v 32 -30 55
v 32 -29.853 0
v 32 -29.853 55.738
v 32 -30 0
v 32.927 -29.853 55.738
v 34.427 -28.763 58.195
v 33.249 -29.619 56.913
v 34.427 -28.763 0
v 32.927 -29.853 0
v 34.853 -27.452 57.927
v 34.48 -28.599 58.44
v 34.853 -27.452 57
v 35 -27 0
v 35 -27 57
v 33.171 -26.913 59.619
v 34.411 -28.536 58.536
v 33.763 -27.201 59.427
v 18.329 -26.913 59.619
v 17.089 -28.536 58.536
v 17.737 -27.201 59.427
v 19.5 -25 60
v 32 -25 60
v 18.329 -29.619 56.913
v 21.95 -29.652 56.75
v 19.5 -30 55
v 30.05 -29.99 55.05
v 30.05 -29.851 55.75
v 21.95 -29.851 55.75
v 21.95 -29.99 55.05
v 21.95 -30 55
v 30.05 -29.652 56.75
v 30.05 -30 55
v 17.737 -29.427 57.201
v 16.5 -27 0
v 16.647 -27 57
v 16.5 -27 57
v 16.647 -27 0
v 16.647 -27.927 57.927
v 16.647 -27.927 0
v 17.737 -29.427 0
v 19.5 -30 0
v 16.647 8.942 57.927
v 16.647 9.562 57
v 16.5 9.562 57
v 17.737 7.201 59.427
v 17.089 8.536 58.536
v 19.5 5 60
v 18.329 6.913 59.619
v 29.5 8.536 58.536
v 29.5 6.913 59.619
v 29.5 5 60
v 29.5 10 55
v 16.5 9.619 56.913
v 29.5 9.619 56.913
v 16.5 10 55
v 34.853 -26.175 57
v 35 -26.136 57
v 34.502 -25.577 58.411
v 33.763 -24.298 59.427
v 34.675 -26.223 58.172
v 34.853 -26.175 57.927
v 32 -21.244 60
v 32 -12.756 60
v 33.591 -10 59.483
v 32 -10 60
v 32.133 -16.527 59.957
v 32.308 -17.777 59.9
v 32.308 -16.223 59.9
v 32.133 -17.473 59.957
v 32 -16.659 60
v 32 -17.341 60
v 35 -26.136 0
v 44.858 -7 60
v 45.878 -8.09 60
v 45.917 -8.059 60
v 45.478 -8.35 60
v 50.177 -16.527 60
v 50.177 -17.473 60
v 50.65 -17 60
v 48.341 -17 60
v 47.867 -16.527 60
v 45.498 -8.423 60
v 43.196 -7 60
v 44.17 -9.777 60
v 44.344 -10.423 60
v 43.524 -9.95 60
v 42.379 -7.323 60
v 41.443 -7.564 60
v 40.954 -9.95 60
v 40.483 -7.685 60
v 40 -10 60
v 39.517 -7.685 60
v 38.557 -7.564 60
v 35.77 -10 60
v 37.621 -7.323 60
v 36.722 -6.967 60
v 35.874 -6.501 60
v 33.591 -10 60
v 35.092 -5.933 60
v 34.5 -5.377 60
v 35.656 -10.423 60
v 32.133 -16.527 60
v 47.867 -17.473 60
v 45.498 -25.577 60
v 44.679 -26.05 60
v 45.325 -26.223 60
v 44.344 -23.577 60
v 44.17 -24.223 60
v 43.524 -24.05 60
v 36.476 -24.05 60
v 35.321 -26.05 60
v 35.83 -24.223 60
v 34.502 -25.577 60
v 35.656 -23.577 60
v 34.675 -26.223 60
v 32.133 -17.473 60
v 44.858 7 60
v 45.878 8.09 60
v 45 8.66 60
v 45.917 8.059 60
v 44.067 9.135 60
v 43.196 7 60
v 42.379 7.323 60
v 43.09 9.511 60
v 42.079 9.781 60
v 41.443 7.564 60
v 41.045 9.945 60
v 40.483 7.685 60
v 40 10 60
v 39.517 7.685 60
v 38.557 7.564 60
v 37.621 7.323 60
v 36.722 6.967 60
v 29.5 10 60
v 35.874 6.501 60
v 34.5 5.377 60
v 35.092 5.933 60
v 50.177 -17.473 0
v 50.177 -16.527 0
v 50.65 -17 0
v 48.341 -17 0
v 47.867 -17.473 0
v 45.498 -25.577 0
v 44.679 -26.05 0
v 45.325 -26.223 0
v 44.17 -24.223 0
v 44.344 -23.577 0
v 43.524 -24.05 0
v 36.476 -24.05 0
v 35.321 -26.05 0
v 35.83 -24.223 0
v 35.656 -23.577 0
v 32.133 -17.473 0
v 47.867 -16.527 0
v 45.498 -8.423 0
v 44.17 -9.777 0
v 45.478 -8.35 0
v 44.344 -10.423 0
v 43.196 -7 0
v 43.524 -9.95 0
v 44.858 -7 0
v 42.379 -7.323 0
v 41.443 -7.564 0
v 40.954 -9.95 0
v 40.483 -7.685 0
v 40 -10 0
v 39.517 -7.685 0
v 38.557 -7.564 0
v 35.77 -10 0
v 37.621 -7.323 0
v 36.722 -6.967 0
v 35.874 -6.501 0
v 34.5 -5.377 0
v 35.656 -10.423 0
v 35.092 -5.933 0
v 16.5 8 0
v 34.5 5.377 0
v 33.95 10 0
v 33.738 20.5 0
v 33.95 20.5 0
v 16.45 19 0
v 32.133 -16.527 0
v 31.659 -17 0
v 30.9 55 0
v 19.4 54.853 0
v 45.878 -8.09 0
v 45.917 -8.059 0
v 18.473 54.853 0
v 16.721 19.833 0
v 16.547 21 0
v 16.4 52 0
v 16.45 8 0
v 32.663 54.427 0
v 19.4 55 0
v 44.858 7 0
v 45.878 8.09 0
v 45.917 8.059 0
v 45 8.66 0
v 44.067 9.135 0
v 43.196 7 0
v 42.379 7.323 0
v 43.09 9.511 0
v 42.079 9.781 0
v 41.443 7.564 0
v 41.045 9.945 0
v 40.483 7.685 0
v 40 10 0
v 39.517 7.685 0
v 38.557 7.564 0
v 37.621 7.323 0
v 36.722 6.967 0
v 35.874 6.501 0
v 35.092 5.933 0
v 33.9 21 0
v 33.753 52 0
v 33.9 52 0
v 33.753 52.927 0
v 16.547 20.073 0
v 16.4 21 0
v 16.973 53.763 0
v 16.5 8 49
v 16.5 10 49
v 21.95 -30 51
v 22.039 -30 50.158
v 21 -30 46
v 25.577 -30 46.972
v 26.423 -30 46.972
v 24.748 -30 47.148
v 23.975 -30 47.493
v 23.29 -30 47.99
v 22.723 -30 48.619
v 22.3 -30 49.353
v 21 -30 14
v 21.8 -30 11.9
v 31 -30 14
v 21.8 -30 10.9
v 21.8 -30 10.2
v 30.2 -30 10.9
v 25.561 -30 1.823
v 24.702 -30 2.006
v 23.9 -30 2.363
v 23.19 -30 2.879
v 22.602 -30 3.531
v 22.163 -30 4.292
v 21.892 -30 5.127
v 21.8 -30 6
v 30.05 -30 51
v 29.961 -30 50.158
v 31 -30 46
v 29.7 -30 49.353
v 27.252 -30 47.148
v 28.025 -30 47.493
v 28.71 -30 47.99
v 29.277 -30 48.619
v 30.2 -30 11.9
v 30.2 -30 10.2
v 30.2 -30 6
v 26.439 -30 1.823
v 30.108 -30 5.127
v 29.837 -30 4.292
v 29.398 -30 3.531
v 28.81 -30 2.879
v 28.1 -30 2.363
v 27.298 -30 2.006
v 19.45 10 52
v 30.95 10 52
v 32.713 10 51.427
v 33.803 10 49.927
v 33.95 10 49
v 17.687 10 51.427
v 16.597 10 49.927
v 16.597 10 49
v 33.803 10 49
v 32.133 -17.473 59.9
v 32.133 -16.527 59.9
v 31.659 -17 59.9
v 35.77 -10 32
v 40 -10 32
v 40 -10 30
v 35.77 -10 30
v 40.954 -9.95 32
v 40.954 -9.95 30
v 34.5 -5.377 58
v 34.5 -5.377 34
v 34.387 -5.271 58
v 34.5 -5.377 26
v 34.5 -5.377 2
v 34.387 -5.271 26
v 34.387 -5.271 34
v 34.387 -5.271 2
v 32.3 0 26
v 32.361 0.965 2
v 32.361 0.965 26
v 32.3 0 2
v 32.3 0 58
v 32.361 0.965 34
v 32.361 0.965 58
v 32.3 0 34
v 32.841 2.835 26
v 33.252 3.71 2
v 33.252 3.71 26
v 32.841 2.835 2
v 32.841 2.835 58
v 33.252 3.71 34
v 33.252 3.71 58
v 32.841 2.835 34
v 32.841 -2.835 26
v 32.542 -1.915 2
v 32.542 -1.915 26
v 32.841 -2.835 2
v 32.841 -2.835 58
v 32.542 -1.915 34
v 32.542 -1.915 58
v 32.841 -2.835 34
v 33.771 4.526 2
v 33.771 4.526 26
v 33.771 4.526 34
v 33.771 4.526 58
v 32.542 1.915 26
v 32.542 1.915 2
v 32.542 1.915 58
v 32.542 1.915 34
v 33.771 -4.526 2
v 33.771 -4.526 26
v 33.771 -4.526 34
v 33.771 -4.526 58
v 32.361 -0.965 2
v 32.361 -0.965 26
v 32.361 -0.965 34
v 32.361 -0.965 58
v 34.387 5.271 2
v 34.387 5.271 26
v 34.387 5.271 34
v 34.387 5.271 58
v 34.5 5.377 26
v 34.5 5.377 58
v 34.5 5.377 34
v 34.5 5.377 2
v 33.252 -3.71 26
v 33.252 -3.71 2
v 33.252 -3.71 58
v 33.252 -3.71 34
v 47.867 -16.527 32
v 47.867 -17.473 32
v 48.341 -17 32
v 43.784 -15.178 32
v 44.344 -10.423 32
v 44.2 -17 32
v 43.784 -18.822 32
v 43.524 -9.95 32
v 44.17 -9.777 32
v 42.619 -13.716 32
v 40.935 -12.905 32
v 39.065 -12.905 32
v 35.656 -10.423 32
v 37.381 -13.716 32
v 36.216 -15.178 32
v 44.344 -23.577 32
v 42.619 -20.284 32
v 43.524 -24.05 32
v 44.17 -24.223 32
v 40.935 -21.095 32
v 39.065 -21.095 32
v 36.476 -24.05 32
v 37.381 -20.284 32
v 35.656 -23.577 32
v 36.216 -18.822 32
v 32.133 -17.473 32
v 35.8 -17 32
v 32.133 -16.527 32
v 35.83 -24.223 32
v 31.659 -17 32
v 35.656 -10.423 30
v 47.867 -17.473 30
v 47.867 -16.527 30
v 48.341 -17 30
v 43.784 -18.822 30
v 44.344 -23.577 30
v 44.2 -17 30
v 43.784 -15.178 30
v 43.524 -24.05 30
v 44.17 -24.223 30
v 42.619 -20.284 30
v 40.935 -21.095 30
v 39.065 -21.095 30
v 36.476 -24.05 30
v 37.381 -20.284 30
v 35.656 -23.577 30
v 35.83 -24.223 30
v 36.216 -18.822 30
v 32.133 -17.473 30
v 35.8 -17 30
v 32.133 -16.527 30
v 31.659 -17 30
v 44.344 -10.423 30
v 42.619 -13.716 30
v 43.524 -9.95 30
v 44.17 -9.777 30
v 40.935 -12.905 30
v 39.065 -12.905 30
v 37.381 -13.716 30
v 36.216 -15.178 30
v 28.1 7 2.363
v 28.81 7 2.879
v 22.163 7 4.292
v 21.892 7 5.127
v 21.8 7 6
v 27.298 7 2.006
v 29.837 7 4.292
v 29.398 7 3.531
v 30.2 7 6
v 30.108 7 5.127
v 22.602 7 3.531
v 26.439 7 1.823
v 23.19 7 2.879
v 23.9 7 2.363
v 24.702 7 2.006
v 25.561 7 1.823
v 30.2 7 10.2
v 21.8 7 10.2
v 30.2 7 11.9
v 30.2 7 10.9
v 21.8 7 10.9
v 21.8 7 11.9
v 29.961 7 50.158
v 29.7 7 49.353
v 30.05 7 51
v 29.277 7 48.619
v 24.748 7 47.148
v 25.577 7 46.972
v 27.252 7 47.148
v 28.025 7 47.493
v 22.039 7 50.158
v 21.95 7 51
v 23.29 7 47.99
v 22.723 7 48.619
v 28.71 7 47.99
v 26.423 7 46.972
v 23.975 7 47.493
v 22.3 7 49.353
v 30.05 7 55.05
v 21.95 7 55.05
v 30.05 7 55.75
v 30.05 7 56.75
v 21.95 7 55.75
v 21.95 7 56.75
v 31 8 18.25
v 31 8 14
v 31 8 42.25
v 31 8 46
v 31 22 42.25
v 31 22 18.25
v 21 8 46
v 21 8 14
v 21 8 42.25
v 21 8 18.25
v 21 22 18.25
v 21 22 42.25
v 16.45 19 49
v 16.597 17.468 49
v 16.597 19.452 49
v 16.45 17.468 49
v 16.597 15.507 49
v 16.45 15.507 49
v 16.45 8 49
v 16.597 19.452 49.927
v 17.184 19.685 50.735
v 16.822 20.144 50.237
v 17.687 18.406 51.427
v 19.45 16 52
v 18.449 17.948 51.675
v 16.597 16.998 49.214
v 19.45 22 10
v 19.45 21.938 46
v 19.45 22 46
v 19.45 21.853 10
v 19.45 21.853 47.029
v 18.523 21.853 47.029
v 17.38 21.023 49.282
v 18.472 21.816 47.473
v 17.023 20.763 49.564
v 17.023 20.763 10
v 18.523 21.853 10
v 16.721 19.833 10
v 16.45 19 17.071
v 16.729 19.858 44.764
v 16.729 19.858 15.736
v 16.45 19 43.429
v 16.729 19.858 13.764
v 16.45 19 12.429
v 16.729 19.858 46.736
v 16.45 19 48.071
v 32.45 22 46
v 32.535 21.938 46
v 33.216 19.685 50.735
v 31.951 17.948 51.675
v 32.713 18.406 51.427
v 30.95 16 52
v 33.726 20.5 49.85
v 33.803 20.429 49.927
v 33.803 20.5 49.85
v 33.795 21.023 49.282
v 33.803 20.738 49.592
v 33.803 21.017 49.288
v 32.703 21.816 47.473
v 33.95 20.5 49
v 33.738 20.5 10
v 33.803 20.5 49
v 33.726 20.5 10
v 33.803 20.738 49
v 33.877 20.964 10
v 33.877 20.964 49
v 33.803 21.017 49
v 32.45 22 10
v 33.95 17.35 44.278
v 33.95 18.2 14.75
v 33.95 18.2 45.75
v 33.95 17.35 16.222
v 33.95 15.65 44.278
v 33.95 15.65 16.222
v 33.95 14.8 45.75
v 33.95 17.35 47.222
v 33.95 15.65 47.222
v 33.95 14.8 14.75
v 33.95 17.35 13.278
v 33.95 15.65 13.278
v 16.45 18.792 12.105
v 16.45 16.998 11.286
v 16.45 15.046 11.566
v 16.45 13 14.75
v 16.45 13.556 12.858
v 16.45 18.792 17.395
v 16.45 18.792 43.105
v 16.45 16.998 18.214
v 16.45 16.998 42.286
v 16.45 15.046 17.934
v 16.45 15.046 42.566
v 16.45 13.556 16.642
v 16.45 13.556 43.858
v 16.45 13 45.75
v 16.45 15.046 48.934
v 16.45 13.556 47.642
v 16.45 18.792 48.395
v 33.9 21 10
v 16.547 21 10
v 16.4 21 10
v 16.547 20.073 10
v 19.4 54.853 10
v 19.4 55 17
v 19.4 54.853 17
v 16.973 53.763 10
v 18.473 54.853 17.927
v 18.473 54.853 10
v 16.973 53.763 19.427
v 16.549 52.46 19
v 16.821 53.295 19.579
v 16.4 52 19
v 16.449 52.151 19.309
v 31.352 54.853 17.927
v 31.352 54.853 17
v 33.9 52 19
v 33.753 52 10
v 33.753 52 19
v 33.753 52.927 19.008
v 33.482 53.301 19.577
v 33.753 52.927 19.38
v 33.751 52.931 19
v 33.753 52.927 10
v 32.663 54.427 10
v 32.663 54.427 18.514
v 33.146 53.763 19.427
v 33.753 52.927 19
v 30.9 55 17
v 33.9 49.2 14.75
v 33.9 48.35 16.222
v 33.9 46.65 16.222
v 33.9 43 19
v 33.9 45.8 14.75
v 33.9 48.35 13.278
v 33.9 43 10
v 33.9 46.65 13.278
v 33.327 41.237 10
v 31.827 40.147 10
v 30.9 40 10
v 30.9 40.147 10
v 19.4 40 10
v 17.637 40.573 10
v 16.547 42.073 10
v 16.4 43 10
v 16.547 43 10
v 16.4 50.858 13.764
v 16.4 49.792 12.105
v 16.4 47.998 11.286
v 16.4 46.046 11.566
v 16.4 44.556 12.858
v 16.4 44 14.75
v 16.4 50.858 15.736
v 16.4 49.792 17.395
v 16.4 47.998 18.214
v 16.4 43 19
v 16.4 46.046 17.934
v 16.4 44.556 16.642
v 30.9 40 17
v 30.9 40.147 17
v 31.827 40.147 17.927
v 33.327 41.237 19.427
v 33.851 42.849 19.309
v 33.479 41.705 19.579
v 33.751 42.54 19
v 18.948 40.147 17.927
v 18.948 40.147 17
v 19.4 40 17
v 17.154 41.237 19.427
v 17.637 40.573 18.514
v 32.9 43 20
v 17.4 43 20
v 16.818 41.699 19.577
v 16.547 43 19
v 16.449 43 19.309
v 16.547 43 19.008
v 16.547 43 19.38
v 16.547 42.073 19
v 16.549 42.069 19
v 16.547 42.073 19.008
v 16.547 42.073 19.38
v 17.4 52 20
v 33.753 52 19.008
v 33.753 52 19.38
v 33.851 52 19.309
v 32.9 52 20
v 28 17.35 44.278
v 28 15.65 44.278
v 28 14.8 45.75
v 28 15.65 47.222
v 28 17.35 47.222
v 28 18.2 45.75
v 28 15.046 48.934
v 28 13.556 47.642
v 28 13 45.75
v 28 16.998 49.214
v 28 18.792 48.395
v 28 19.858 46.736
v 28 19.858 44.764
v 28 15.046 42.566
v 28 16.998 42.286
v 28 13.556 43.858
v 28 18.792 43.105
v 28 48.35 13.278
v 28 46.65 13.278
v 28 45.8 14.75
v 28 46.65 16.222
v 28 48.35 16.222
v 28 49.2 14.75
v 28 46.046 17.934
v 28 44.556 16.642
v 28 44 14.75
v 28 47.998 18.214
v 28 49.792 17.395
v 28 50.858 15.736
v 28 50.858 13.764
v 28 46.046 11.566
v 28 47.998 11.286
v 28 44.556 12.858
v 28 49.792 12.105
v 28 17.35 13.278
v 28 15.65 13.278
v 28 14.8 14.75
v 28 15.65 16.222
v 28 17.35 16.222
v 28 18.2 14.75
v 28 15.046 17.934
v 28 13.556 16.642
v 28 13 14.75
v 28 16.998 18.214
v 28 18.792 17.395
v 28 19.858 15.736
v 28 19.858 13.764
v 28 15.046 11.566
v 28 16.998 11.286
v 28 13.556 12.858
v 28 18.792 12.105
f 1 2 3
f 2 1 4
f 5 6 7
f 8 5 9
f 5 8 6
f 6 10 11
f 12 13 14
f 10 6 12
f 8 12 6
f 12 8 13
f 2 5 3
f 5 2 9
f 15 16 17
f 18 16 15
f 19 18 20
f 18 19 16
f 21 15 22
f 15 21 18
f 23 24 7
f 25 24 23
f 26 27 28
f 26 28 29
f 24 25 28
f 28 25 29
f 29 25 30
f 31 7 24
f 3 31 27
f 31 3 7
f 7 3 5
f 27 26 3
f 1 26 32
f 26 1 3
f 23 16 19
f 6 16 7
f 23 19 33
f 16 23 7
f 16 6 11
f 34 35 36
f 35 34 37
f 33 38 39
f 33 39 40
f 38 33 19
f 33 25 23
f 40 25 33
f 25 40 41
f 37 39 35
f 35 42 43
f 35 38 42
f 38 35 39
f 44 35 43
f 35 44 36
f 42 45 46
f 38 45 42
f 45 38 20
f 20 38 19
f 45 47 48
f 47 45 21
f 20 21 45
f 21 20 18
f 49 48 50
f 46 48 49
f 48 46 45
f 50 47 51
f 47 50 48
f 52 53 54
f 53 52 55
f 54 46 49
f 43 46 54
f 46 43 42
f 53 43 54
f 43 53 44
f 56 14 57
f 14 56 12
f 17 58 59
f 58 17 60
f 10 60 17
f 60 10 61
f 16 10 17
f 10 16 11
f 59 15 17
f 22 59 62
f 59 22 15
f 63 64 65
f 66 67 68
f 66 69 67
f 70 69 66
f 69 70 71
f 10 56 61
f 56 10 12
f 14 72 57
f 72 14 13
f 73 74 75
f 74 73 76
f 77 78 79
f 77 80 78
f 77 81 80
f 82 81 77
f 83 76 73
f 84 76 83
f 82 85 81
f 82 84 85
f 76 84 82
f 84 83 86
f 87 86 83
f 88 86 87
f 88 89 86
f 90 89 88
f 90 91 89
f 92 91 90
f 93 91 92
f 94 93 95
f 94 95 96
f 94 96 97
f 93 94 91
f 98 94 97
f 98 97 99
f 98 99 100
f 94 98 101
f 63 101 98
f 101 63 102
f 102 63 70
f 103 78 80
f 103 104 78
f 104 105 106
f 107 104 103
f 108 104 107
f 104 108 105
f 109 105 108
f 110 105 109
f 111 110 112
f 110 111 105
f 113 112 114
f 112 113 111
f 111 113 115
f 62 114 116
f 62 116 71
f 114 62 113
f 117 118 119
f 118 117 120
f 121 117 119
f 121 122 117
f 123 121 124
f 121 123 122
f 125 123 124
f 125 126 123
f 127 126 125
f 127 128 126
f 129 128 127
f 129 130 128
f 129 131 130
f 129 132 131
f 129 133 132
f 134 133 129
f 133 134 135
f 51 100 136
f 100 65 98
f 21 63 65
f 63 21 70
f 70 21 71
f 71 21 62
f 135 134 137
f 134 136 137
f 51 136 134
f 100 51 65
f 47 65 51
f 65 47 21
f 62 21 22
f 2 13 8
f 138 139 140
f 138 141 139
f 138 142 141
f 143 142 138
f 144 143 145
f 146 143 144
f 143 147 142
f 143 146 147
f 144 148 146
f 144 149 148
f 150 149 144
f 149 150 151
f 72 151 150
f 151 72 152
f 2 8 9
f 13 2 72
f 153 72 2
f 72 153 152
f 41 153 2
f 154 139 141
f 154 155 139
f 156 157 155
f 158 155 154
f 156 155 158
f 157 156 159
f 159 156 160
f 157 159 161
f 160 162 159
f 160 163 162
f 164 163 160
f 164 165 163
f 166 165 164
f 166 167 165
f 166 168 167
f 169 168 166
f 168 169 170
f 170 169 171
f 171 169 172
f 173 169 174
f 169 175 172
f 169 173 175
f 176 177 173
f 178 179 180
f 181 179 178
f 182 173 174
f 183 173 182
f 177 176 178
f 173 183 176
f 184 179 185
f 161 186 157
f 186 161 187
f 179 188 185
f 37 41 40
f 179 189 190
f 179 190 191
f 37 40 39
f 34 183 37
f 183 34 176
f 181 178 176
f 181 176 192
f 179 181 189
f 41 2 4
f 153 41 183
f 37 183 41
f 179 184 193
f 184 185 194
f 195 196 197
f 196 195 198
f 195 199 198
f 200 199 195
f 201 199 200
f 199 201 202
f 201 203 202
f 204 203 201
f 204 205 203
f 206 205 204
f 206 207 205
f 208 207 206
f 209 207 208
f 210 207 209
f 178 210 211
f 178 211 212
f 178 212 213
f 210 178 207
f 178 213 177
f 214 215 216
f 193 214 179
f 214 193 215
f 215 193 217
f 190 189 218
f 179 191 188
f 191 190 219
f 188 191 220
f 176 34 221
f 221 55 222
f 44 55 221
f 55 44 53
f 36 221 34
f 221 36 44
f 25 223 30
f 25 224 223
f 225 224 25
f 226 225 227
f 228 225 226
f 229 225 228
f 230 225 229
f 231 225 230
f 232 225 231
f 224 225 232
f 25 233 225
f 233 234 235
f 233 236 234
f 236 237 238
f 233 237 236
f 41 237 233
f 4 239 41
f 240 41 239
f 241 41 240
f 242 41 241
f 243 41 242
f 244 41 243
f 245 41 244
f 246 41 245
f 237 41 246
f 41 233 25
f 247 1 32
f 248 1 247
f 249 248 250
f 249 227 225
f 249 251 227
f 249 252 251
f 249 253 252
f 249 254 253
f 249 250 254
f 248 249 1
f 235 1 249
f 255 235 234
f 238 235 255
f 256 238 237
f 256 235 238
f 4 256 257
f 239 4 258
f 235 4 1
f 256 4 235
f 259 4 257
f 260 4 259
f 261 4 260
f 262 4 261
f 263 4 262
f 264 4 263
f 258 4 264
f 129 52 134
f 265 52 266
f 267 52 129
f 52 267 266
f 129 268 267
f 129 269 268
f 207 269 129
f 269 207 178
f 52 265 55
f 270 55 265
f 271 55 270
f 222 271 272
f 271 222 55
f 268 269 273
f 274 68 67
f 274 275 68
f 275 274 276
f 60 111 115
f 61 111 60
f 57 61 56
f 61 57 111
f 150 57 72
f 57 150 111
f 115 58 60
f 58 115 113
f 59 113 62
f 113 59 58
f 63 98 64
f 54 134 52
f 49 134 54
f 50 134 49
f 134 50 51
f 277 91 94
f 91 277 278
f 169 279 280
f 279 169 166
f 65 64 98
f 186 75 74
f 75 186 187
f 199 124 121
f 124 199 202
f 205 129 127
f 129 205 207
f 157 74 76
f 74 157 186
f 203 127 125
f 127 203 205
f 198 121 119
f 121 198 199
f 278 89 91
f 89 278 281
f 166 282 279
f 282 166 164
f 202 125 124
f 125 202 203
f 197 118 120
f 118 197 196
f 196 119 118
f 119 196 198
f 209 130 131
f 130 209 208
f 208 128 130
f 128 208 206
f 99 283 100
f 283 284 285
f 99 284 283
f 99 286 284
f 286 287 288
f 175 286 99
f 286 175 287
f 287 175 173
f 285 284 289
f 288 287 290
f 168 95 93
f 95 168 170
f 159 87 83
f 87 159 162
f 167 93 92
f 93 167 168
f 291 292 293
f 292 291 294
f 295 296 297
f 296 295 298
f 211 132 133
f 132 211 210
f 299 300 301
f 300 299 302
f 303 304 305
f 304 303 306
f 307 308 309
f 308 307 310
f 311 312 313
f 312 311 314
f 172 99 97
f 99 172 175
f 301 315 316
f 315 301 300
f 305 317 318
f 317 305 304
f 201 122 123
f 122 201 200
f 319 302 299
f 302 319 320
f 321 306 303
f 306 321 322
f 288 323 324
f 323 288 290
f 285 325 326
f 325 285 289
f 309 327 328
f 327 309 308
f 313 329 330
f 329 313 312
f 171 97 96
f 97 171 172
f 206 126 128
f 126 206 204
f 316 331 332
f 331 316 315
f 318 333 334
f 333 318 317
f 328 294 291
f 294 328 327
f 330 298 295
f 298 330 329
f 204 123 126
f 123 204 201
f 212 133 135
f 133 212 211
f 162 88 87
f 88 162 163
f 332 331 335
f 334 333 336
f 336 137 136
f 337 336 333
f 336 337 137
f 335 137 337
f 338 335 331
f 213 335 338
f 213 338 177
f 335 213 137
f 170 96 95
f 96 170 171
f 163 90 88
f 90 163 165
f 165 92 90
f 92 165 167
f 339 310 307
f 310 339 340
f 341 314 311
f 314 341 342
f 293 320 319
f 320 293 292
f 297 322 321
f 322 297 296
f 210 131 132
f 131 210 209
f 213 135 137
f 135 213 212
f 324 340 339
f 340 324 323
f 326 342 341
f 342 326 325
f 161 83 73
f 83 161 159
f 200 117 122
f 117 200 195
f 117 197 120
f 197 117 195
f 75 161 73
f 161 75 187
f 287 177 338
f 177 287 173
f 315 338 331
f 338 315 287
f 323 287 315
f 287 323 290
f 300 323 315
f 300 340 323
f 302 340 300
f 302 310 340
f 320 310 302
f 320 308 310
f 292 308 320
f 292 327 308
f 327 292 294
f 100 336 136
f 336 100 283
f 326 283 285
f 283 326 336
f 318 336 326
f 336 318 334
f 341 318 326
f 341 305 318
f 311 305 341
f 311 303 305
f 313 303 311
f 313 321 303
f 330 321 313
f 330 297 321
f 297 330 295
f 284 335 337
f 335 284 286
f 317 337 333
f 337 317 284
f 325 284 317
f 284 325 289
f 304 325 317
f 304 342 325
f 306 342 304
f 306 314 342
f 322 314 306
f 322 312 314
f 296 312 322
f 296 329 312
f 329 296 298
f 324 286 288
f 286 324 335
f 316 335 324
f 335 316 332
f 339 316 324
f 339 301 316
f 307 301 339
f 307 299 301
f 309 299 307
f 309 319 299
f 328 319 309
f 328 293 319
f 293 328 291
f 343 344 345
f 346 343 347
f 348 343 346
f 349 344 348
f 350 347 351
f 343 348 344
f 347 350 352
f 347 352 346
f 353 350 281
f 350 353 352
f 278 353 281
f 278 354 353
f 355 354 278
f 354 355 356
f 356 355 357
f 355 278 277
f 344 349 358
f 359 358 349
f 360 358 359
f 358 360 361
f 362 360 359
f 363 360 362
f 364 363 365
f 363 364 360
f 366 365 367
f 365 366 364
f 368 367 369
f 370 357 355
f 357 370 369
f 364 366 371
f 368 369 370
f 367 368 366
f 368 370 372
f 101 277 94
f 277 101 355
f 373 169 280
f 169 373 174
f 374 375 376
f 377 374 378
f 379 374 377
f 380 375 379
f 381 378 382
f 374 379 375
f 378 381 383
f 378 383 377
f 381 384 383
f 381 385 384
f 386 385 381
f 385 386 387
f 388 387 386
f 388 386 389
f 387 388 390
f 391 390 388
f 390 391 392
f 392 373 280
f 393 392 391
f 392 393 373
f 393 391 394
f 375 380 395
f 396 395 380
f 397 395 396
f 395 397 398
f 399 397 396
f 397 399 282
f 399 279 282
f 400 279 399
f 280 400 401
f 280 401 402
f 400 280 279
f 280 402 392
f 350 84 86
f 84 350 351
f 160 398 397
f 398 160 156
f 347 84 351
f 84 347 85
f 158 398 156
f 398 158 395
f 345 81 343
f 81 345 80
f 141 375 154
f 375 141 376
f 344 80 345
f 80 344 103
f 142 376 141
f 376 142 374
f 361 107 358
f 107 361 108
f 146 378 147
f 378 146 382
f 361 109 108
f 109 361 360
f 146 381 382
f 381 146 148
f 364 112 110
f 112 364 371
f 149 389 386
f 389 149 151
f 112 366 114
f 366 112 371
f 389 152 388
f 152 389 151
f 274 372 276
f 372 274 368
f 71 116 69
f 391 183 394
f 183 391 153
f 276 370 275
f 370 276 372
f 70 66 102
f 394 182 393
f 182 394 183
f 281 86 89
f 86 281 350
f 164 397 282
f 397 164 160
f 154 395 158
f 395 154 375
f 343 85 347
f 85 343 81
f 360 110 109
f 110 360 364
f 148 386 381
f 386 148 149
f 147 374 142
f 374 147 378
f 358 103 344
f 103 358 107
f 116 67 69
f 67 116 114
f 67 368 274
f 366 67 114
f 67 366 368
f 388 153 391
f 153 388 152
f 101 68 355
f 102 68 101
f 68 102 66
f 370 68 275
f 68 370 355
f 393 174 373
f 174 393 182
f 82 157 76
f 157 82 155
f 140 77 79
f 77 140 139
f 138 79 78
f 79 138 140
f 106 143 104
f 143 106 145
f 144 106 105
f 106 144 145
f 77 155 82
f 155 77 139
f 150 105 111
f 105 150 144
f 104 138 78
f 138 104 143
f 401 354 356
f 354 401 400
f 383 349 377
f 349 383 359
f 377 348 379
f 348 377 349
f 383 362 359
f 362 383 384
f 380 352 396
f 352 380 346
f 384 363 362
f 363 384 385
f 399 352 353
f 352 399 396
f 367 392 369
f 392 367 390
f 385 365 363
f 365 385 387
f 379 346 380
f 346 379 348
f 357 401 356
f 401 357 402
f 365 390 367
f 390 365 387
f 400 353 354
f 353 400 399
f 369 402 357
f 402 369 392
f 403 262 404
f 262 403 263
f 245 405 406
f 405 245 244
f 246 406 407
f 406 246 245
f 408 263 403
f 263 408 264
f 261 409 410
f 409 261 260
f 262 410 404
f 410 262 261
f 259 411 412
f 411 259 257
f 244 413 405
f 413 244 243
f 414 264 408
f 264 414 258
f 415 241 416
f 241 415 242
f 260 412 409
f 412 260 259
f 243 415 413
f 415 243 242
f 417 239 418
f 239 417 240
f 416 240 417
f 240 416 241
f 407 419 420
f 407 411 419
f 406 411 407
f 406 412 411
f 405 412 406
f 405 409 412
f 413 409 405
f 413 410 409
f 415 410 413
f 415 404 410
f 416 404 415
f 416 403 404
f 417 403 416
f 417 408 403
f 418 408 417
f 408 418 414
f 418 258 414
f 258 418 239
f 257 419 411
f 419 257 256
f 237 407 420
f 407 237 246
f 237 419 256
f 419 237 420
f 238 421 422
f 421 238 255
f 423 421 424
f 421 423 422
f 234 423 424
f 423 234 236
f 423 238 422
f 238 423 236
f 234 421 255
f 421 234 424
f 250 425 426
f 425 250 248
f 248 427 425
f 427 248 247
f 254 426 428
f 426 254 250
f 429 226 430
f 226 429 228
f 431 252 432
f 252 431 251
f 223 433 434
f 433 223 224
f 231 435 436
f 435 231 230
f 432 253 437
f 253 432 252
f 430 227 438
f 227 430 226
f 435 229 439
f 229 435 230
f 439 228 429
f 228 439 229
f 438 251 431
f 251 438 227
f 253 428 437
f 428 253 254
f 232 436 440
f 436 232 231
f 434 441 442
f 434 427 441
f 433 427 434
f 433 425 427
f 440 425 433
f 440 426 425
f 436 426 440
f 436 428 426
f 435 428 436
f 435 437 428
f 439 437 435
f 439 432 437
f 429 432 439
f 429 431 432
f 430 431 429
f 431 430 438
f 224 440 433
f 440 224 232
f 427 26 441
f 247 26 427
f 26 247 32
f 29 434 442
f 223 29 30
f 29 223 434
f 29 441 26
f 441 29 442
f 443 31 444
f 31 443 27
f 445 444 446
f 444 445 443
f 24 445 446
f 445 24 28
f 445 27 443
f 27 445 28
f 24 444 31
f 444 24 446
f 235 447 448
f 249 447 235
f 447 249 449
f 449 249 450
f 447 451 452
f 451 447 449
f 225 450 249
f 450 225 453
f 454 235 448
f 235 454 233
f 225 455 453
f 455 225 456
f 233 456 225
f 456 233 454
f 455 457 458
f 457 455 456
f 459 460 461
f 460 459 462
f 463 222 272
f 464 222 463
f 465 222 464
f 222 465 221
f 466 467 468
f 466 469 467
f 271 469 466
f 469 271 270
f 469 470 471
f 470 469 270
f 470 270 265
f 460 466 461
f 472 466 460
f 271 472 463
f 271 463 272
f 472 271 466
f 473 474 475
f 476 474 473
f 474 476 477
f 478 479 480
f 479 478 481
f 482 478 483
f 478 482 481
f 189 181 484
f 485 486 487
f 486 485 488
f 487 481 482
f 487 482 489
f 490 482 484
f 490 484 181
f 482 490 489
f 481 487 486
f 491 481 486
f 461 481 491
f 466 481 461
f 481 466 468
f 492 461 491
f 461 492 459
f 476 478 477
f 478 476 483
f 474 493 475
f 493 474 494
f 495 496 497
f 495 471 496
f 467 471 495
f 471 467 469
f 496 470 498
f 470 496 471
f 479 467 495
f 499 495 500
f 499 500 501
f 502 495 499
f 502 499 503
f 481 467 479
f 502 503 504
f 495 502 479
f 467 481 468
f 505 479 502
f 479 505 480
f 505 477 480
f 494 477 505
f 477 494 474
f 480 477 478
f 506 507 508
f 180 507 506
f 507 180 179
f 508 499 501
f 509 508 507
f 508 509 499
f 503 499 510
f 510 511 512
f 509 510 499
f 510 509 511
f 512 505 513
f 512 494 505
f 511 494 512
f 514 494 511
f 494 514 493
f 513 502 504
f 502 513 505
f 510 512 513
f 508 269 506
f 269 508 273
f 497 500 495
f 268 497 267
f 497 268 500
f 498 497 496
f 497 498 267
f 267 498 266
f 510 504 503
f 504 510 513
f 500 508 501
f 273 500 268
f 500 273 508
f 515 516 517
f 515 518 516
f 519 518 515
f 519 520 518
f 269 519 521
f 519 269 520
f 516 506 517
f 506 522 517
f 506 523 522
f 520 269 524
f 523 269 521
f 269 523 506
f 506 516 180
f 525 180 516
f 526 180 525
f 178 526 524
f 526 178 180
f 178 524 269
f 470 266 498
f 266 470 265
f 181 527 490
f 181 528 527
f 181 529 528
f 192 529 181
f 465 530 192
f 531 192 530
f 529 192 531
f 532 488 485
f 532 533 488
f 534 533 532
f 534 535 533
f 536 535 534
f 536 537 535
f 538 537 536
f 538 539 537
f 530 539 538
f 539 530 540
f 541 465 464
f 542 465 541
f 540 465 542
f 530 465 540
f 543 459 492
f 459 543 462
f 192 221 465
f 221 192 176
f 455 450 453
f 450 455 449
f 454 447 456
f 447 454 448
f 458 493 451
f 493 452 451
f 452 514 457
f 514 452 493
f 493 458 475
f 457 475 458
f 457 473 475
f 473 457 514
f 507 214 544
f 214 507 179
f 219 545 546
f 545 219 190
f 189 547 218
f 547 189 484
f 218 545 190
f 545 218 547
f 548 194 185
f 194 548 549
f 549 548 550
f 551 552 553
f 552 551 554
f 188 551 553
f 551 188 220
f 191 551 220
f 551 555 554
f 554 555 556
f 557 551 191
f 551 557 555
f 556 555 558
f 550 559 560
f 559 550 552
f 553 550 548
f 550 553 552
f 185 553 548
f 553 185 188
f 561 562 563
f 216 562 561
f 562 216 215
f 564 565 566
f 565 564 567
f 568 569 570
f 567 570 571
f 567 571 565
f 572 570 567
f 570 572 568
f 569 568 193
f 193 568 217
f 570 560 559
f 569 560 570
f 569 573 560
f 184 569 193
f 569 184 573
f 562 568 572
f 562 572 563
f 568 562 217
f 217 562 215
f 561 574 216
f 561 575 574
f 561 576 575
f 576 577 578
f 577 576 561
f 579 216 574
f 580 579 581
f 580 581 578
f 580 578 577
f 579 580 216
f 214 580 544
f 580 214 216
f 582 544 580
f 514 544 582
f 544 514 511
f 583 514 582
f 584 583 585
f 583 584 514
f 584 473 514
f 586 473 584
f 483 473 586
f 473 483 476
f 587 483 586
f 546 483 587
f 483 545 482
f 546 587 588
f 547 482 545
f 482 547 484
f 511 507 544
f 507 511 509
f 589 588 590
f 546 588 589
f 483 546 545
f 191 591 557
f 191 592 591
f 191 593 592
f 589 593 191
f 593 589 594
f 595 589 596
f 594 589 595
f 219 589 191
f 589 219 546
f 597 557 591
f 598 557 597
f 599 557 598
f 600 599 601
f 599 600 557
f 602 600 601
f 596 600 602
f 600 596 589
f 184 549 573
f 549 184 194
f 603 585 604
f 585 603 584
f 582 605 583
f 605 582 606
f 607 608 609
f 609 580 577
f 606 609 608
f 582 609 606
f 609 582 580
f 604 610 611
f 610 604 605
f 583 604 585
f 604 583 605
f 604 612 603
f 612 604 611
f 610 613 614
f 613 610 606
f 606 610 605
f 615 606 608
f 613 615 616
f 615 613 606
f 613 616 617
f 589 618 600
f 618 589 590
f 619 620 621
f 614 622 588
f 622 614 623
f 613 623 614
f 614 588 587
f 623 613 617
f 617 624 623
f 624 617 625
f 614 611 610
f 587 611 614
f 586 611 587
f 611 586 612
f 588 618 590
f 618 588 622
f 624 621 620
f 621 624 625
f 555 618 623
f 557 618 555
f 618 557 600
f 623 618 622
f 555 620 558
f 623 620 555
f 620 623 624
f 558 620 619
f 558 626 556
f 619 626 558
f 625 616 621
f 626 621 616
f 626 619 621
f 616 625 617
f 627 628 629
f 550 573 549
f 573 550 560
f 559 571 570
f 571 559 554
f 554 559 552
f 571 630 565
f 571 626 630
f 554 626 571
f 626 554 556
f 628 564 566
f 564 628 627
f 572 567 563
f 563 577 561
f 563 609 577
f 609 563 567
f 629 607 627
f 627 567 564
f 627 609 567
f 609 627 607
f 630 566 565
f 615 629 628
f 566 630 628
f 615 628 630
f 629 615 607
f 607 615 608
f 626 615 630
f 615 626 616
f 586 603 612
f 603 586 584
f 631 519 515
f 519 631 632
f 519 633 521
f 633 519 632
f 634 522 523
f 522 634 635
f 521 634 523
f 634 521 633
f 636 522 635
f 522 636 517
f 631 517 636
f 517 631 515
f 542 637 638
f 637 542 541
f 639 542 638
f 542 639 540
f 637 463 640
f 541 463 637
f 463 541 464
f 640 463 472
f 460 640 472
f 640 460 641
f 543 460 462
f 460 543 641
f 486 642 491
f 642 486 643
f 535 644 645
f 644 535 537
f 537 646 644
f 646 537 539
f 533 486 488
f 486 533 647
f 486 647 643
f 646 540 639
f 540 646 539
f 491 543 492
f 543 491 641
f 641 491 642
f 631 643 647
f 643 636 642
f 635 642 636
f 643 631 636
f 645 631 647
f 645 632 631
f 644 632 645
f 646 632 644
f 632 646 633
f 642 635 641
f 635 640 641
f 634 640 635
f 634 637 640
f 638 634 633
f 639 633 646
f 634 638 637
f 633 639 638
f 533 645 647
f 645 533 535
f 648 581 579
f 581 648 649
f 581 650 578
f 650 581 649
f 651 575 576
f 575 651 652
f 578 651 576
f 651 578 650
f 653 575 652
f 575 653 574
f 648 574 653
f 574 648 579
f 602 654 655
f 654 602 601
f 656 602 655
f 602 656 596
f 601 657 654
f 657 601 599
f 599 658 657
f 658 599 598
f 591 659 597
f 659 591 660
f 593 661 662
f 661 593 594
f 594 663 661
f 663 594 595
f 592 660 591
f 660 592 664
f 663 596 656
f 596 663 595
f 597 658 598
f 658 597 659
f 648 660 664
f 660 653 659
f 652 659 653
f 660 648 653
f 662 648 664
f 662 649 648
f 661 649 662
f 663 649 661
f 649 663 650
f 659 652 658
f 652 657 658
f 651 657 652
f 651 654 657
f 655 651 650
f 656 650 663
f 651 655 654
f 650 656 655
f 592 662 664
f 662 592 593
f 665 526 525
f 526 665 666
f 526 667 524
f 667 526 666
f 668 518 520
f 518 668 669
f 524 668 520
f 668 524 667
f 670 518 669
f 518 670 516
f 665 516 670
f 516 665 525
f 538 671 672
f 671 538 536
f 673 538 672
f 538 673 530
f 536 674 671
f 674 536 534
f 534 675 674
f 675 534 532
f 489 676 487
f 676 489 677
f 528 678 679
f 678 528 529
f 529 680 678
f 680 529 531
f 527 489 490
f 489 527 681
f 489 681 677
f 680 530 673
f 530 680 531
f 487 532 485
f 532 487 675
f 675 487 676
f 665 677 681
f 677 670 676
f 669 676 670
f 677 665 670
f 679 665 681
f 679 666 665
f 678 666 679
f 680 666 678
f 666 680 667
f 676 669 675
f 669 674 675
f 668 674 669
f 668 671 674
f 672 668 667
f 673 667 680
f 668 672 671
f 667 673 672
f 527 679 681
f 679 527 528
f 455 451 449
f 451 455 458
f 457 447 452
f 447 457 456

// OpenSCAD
// file: inc/functions.scad
// PRUSA iteration3
// Functions used in many files
// GNU GPL v3
// Josef Průša <josefprusa@me.com>
// Václav 'ax' Hůla <axtheb@gmail.com>
// Vlnofka <>
// http://www.reprap.org/wiki/Prusa_Mendel
// http://github.com/prusajr/PrusaMendel

module roundcorner(diameter){
	difference(){
		cube(size = [diameter,diameter,99], center = false);
		translate(v = [diameter, diameter, 0]) cylinder(h = 100, r=diameter, center=true);
	}
}
module nut(d,h,horizontal=true){
    cornerdiameter =  (d / 2) / cos (180 / 6);
    cylinder(h = h, r = cornerdiameter, $fn = 6);
    if(horizontal){
        for(i = [1:6]){
            rotate([0,0,60*i]) translate([-cornerdiameter-0.2,0,0]) rotate([0,0,-45]) cube([2,2,h]);
        }
    }
}

// Based on nophead research
module polyhole(d, h, center=false) {
    n = max(round(2 * d),3);
    rotate([0,0,180])
        cylinder(h = h, r = (d / 2) / cos (180 / n), $fn = n);
}

// make it interchangeable between this and cylinder
module cylinder_poly(r, h, center=false){
    polyhole(d=r*2, h=h, center=center);
}

module fillet(radius, height=100, $fn=0) {
    //this creates acutal fillet
    translate([-radius, -radius, -height/2-0.01])
        difference() {
            cube([radius*2, radius*2, height+0.02]);
            cylinder(r=radius, h=height+0.02, $fn=$fn);
        }
}

module cube_fillet(size, radius=-1, vertical=[3,3,3,3], top=[0,0,0,0], bottom=[0,0,0,0], center=false, $fn=0){
    //
    if (center) {
        cube_fillet_inside(size, radius, vertical, top, bottom, $fn);
    } else {
        translate([size[0]/2, size[1]/2, size[2]/2])
            cube_fillet_inside(size, radius, vertical, top, bottom, $fn);
    }
}

module cube_negative_fillet(size, radius=-1, vertical=[3,3,3,3], top=[0,0,0,0], bottom=[0,0,0,0], $fn=0){

    j=[1,0,1,0];

    for (i=[0:3]) {
        if (radius > -1) {
            rotate([0, 0, 90*i]) translate([size[1-j[i]]/2, size[j[i]]/2, 0]) fillet(radius, size[2], $fn=$fn);
        } else {
            rotate([0, 0, 90*i]) translate([size[1-j[i]]/2, size[j[i]]/2, 0]) fillet(vertical[i], size[2], $fn=$fn);
        }
        rotate([90*i, -90, 0]) translate([size[2]/2, size[j[i]]/2, 0 ]) fillet(top[i], size[1-j[i]], $fn=$fn);
        rotate([90*(4-i), 90, 0]) translate([size[2]/2, size[j[i]]/2, 0]) fillet(bottom[i], size[1-j[i]], $fn=$fn);

    }
}

module cube_fillet_inside(size, radius=-1, vertical=[3,3,3,3], top=[0,0,0,0], bottom=[0,0,0,0], $fn=0){
    //makes CENTERED cube with round corners
    // if you give it radius, it will fillet vertical corners.
    //othervise use vertical, top, bottom arrays
    //when viewed from top, it starts in upper right corner (+x,+y quadrant) , goes counterclockwise
    //top/bottom fillet starts in direction of Y axis and goes CCW too


    if (radius == 0) {
        cube(size, center=true);
    } else {
        difference() {
            cube(size, center=true);
            cube_negative_fillet(size, radius, vertical, top, bottom, $fn);
        }
    }
}


module nema17(places=[1,1,1,1], size=15.5, h=10, holes=false, shadow=false, $fn=24){
    for (i=[0:3]) {
        if (places[i] == 1) {
            rotate([0, 0, 90*i]) translate([size, size, 0]) {
                if (holes) {
                    #rotate([0, 0, -90*i])  translate([0,0,-10]) screw(r=1.7, slant=false, head_drop=13, $fn=$fn, h=h+12);
                } else {
                    rotate([0, 0, -90*i]) cylinder(h=h, r=5.5, $fn=$fn);
                }
            }
        }
    }
    if (shadow != false) {
        %translate ([0, 0, shadow+21+3]) cube([42,42,42], center = true);
    //flange
        %translate ([0, 0, shadow+21+3-21-1]) cylinder(r=11,h=2, center = true, $fn=20);
    //shaft
        %translate ([0, 0, shadow+21+3-21-7]) cylinder(r=2.5,h=14, center = true);
    }
}

module screw(h=20, r=2, r_head=3.5, head_drop=0, slant=true, poly=false, $fn=0){
    //makes screw with head
    //for substraction as screw hole
    if (poly) {
        cylinder_poly(h=h, r=r, $fn=$fn);
    } else {
        cylinder(h=h, r=r, $fn=$fn);
    }
    if (slant) {
        translate([0, 0, head_drop-0.01]) cylinder(h=r_head, r2=0, r1=r_head, $fn=$fn);
    }

    if (head_drop > 0) {
        translate([0, 0, -0.01]) cylinder(h=head_drop+0.01, r=r_head, $fn=$fn);
    }
}
module screw_cylinder(r_head=5.25,r=3.25,head_drop=6.2,slant=false){
	screw(r_head=r_head,head_drop=head_drop,r=r, slant=slant);

}

//screw_cylinder();
//cube_fillet([10,20,30], vertical=[3,2,0,0], top=[3,2,0,5], bottom=[3,2,0,5]);
//cube_fillet([10,20,30], radius=2, top=[7,2,7,2]);
// file: inc/metric.scad
// PRUSA iteration3
// Default metric sizes
// GNU GPL v3
// Josef Průša <josefprusa@me.com>
// http://www.reprap.org/wiki/Prusa_Mendel
// http://github.com/prusajr/PrusaMendel

// DONT CHANGE THIS FILE! ALTER VALUES IN CONFIGURATION.SCAD INSTEAD

// RODS

threaded_rod_diameter = 8.7;
threaded_rod_diameter_horizontal = 8.7;
smooth_bar_diameter = 8;
smooth_bar_diameter_horizontal = 8.8;

// Nuts and bolts

m8_diameter = 9;
m8_nut_diameter = 14.1;

m4_diameter = 4.5;
m4_nut_diameter = 9;
m4_nut_diameter_horizontal=4.8;

m3_diameter = 3.6;
m3_nut_diameter = 5.3;
m3_nut_diameter_horizontal = 6.1;

// Bushing holder

bushing_core_diameter = smooth_bar_diameter;
bushing_material_thickness = 1;

// Motors

motor_shaft = 5.5;
// file: bushing.scad
// PRUSA iteration3
// Bushing/bearing housings
// GNU GPL v3
// Josef Průša <josefprusa@me.com>
// Václav 'ax' Hůla <axtheb@gmail.com>
// http://www.reprap.org/wiki/Prusa_Mendel
// http://github.com/prusajr/PrusaMendel

include <configuration.scad>

/**
 * @id bushing
 * @name Bushing
 * @category Printed
 * @id bushing
 */

// Linear bearing options
lm8uu_diameter=(bearing_type==1) ? 16 : 15;
lm8uu_length=(bearing_type==1) ? 25 : 24;
lm8uu_radius = lm8uu_diameter / 2;
block_height = 2*lm8uu_length+17;

// basic building blocks, housings for 1 bushing/bearing
// at [0,0] there is center of the smooth rod, pointing in Z

module linear_bushing_square(h=11) {
    translate([0,0,h/2]) {
        difference(){
            union(){
                translate([-10.5/2,0,0]) cube([10.5,13.8,h], center = true);
                cube([13.8,13.8,h], center = true);
            }
            cube([9,9,h+0.02], center = true);
        }
    }
}

module linear_bushing_round(h=11) {
    difference(){
        union(){
            translate([-10.5/2,0,h/2]) cube([10.5,13.8,h], center = true);
            cylinder(r=7.5, h=h);
        }
        translate([0,0,-0.01])  cylinder(r=5.1, h=h+0.02);
    }
}

module linear_bushing_bronze(h=11) {
    difference(){
        union(){
            translate([-10.5/2,0,h/2]) cube([10.5,13.8,h], center = true);
            cylinder(r=10.7, h=h);
        }
        translate([0,0,-0.01])  cylinder(r=8.1, h=h+0.02);
    }
}

// select right bushing and cut it at angle, so it can be printed upside down
module linear_bushing_long(h=30){
    intersection(){
        if (bushing_type == 0) {
            linear_bushing_square(h);
        }
        if (bushing_type == 1) {
            linear_bushing_round(h);
        }
        if (bushing_type == 2) {
            linear_bushing_bronze(h);
        }
        if (bushing_type == 2) {
            translate([0, 0, 0]) rotate([0,-55,0]) cube([30, 40, 80], center=true);
        } else {
            translate([0, 0, -4]) rotate([0,-45,0]) cube([30, 40, 80], center=true);
        }
    }
}

module linear_bushing(h=65){
    translate([-9.5,0,h/2]) cube([2,13.8,h], center=true);
    linear_bushing_long(h);
    if (h>30) {
        translate([0,0,h]) mirror([0,0,1]) linear_bushing_long(30);
    }
}

//this is for Z axis
module bushing_negative(h=lm8uu_length+4){
    if (bearing_choice == 1) {
        if (bushing_type == 0) {
            translate([0,0,h/2]) cube([9,9,h+0.02], center = true);
        }
        if (bushing_type == 1) {
            translate([0,0,-0.01])  cylinder(r=5.1, h=h+0.02);
        }
        if (bushing_type == 2) {
            translate([0,0,-0.01])  cylinder(r=8.1, h=h+0.02);
        }
    } else {
        translate([0,0,-0.01])  cylinder(r=lm8uu_radius+0.4, h=h+0.02);
    }

}

// this should be more parametric
module firm_foot(){
    difference(){
        union() {
            translate([3-0.25,16,0]) cube_fillet([8.5,18,20], top=[11,0,0,0], center=true);
        }
        #translate([7,14,0]) rotate([0,-90,0]) screw();
			translate([7.1,14,0]) rotate([0,-90,0]) color("red")nut(d=m3_nut_diameter,h=3);

    }

}

module spring_foot(){

    difference(){
        union() {
            translate([0.5,23.5,0]) cube_fillet([3,14,20], top=[11,0,0,0], center=true);
            translate([5,17,0]) rotate([0,0,-15]) cube_fillet([12,3,20], center=true);
            translate([5,13,0]) rotate([0,0,25]) cube_fillet([13,3,20], center=true);
            translate([0,9,0]) cube_fillet([3,6,20], vertical=[0,2,0,0], center=true);
        }
        translate([2,24,0]) rotate([0,-90,0]) screw();
    }
}

module y_bearing(float=false){
    if (bearing_choice == 2) {
        linear_bearing(lm8uu_length+4);
    } else {
        linear_bushing_long(20);
    }
    translate([-9,0,10]) {
        if (float) {
            spring_foot();
            mirror([0,1,0]) spring_foot();
        } else {
            firm_foot();
            mirror([0,1,0]) firm_foot();
        }
    }
}


module linear_bearing(h=0, fillet=false){
    linear_holder_base((h > lm8uu_length+4)? h : lm8uu_length+4, fillet);
    translate([-(3)/2-lm8uu_radius+2,0,1]) cube([3,18,2], center = true);
    translate([-(3)/2-lm8uu_radius+2,0,((h > lm8uu_length+4)? h : lm8uu_length+4)-1]) cube([3,18,2], center = true);
    if ( (h-4)/2 > lm8uu_length){
        translate([-(3)/2-lm8uu_radius+2,0,h/2]) cube([3,18, (h-4)-2*lm8uu_length], center = true);
    }
}

module linear_holder_base(length, fillet=false){

    difference(){
        union(){
            //main block
            translate([-10.5/2,0,length/2]) cube([10.5,lm8uu_diameter+5,length], center = true);
            translate([0,0,0]) cylinder(h = length, r=lm8uu_radius+2.5, $fn=60);
        }
        //main axis
        translate([0,0,-2]) cylinder(h = length+4, r=(lm8uu_diameter+0.4)/2, $fn=50);
        // not needed for zip tie
        //main cut
        translate([10,0,length/2]) cube([20,14,length+4], center = true);
        //smooth entry cut
        translate([12,0,length/2]) rotate([0,0,45]) cube([20,20,length+4], center = true);
        if (fillet) {
            translate([0,0,length/2 ]) cube_negative_fillet([21,lm8uu_diameter+5,length], vertical=[0,3,3,0]);
        }
    }
}


%cylinder(r=4, h=90);
y_bearing();
translate([0,52,0]) y_bearing();
if (bearing_choice == 2) {
    translate([-22, 23, 0]) y_bearing();
} else {
    translate ([-26,23,0]) mirror([1,0,0]) y_bearing(true);
}
// file: configuration.scad
// PRUSA iteration3
// Configuration file
// GNU GPL v3
// Josef Průša <josefprusa@me.com>
// Václav 'ax' Hůla <axtheb@gmail.com>
// http://www.reprap.org/wiki/Prusa_Mendel
// http://github.com/prusajr/PrusaMendel

// PLEASE SELECT ONE OF THE CONFIGURATIONS BELOW
// BY UN-COMMENTING IT

// Uncomment for metric settings
// METRIC METRIC METRIC METRIC METRIC METRIC METRIC METRIC 

include <inc/metric.scad>;

// Custom settings here, tailor to your supplies and print settings

// Select your belt type ******************************************************

//T2.5
//belt_tooth_distance = 2.5;
//belt_tooth_ratio = 0.5;

//T5 (strongly discouraged)
belt_tooth_distance = 5;
belt_tooth_ratio = 0.75;

//HTD3
//belt_tooth_distance = 3;
//belt_tooth_ratio = 0.75;

//MXL
//belt_tooth_distance = 2.032;
//belt_tooth_ratio = 0.64;

// Choose bearing/bushing configuration ***************************************

//Choose from:

// 0 = Z as lm[e]8uu, X and Y bushings
// 1 = all bushings
// 2 = all bearings [default. Do not change unless you really know what you are doing]
// DO NOT OFFER 0 or 1 VARIANTS FOR SALE. We really mean that. In the long run it hurts everyone.

bearing_choice = 2;

// Bushing version
// 0 = square igus housings. By igus we mean JFM-0810-10 or GFM-0810-10
// 1 = round igus (works better if printed precisely)
// 2 = bronze self-aligning bushings
bushing_type = 0;

//Bearing version
// 0 = default lm8uu
// 1 = lme8uu
bearing_type = 0;

// Select idler bearing size **************************************************

// 0 = 608 [standard skate bearings]
// 1 = 624 [roughly same diameter as pulley, makes belt parallel so its prettier]

idler_bearing = 0;

// Thickness of the XZ plate board
board_thickness = 12;

//Layer height * width over thickness. Used for idler sleeve
single_wall_width = 0.3*2.2;

// END of custom settings


// You are not supposed to change this
board_to_xz_distance = 26;
xaxis_rod_distance = 45;
carriage_l = 74;
carriage_hole_to_side = 5;
carriage_hole_height = 4;

//calculated from settings

idler_size = (idler_bearing == 0) ? 22 : 13;

//use 4.5 for 608, 2.5 for 624
idler_size_inner_r = (idler_bearing == 0) ? 4.5 : 2.5;

idler_width = (idler_bearing == 0) ? 9 : 5;

// CHANGE ONLY THE STUFF YOU KNOW
// IT WILL REPLACE DEFAULT SETTING

// RODS

// threaded_rod_diameter = 0;
// threaded_rod_diameter_horizontal = 0;
// smooth_bar_diameter = 0;
// smooth_bar_diameter_horizontal = 0;

// Nuts and bolts

// m8_diameter = 0;
// m8_nut_diameter = 0;

// m4_diameter = 0;
// m4_nut_diameter = 0;

// m3_diameter = 0;
// m3_nut_diameter = 0;

// Bushing holder

// bushing_core_diameter = smooth_bar_diameter;
// bushing_material_thickness = 0;

///counted stuff
m3_nut_diameter_bigger = ((m3_nut_diameter  / 2) / cos (180 / 6))*2;

// functions
include <inc/functions.scad>


// These constants define the geometry of the complete-printer.scad

//x_smooth_rod_length=325;
//y_smooth_rod_length=405;
//z_smooth_rod_length=235;
bed_x_size=225;
bed_y_size=225;

x_smooth_rod_length=450+board_thickness*2+10; // 492 for 16mm thickness; 484 for 12mm thickness
y_smooth_rod_length=470;
z_smooth_rod_length=405;  
bed_x_size=225;
bed_y_size=225;
// main file
// PRUSA iteration3
// X ends
// GNU GPL v3
// Josef Průša <josefprusa@me.com>
// Václav 'ax' Hůla <axtheb@gmail.com>
// http://www.reprap.org/wiki/Prusa_Mendel
// http://github.com/prusajr/PrusaMendel

include <configuration.scad>
use <bushing.scad>


//translate([40,-70,0]) x_end_idler(thru=false);
translate([40,0,0]) x_end_motor();


module x_end_motor(){
    mirror([0,1,0]) {

        x_end_base([3,3,0,0], thru=false);
        /// motor dummy
        //%translate([21-5,-21-11,25]) cube([42,42,42], center = true);
        difference(){
				union(){
                translate([-14.8,-15,26]) cube_fillet([17.5,14,52], center = true, vertical=[0,0,3,1.5], top=[0,3,6,3]);
					translate([-23.6,-55,0]) cube_fillet([17.5,37,10]);
					translate([-23.6,-55,10]) cube_fillet([17.5,15,10],vertical=[3,3,3,3],top=[3,1,3,1]);
				}
					translate([-15, -32, 30.25]) rotate([90, 0, 0])  rotate([0, 90, 0]) nema17(places=[1,0,1,1],holes=true, shadow=5, h=10);
            // motor screw holes
            translate([21-5,-21-11,30.25]){
                // belt hole
                translate([-30,11,0]) cube([10,26,24], center = true);
                
            }
        }
        //smooth rod caps
        translate([-22, -10, 0]) cube([17, 2, 15]);
        translate([-22, -10, 45]) cube([17, 2, 10]);
    }
}


module x_end_base(vfillet=[3,3,3,3], thru=true, len=40){
    difference(){
        union(){
            difference(){
                translate([-13.75-0.5,-10+len/2,30]) cube_fillet([18.5,len,60], center = true, vertical=vfillet, top=[5,3,5,3]);
					translate([0,17,4])nut(d=m8_nut_diameter,h=6.5);
                bushing_negative(60);
				translate([0,17,-0.1])nut_guide(60,true);
            }
            //rotate([0,0,0]) translate([0,-9.5,0]) 
            if (bearing_choice == 1) {
                linear_bushing(60);
            } else {
                linear_bearing(60);
            }
            translate([0,17,0])nut_guide(60);
        }

        // belt hole
        translate([-5.5-10+1.5,22-9,30]) cube([10,55,32], center = true);
			
        // change rod diameter to 8.4 if printing with ABS
        if(thru == true){
            translate([-14,-11,6]) rotate([-90,0,0]) pushfit_rod(8.4,50);
            translate([-14,-11,xaxis_rod_distance+6]) rotate([-90,0,0]) pushfit_rod(8.1,50);
        } else {
            translate([-14,-7,6]) rotate([-90,0,0]) pushfit_rod(8.4,50);
            translate([-14,-7,xaxis_rod_distance+6]) rotate([-90,0,0]) pushfit_rod(8.1,50);
        }


    }

    //threaded rod
    #translate([0,17,0]) %cylinder(h = 70, r=4.2);

}

module nut_guide(height,fill=false){
	difference(){
		translate([0,0,height/2])nut(m8_nut_diameter,h=2);
		if(fill==false){
			cylinder(h = 70, r=4.2);
		}
	}
	difference(){
		nut(m8_nut_diameter+4,h=height);

		if(fill==false){
			translate([0,0,-1])nut(m8_nut_diameter,h=height+2);
		}
	}
}


module x_end_idler(){
    difference() {
        x_end_base(len=42+idler_size_inner_r);
        // idler hole
        translate([0,17+6+idler_size_inner_r,30.25-((bearing_type==0)? 3 : 0)]) rotate([0,-90,0]) cylinder(h = 80, r=2, $fn=30);
		translate([5,17+6+idler_size_inner_r,30.25-((bearing_type==0)? 3 : 0)]) rotate([0,-90,0])cylinder(r=m4_diameter,h=10,$fn=6);
        
    }

}



module pushfit_rod(diameter,length){
    cylinder(h = length, r=diameter/2, $fn=30);
    translate([0,-diameter/4,length/2]) cube([diameter,diameter/2,length], center = true);

    translate([0,-diameter/2-1.2,length/2]) cube([diameter,1,length], center = true);
}
